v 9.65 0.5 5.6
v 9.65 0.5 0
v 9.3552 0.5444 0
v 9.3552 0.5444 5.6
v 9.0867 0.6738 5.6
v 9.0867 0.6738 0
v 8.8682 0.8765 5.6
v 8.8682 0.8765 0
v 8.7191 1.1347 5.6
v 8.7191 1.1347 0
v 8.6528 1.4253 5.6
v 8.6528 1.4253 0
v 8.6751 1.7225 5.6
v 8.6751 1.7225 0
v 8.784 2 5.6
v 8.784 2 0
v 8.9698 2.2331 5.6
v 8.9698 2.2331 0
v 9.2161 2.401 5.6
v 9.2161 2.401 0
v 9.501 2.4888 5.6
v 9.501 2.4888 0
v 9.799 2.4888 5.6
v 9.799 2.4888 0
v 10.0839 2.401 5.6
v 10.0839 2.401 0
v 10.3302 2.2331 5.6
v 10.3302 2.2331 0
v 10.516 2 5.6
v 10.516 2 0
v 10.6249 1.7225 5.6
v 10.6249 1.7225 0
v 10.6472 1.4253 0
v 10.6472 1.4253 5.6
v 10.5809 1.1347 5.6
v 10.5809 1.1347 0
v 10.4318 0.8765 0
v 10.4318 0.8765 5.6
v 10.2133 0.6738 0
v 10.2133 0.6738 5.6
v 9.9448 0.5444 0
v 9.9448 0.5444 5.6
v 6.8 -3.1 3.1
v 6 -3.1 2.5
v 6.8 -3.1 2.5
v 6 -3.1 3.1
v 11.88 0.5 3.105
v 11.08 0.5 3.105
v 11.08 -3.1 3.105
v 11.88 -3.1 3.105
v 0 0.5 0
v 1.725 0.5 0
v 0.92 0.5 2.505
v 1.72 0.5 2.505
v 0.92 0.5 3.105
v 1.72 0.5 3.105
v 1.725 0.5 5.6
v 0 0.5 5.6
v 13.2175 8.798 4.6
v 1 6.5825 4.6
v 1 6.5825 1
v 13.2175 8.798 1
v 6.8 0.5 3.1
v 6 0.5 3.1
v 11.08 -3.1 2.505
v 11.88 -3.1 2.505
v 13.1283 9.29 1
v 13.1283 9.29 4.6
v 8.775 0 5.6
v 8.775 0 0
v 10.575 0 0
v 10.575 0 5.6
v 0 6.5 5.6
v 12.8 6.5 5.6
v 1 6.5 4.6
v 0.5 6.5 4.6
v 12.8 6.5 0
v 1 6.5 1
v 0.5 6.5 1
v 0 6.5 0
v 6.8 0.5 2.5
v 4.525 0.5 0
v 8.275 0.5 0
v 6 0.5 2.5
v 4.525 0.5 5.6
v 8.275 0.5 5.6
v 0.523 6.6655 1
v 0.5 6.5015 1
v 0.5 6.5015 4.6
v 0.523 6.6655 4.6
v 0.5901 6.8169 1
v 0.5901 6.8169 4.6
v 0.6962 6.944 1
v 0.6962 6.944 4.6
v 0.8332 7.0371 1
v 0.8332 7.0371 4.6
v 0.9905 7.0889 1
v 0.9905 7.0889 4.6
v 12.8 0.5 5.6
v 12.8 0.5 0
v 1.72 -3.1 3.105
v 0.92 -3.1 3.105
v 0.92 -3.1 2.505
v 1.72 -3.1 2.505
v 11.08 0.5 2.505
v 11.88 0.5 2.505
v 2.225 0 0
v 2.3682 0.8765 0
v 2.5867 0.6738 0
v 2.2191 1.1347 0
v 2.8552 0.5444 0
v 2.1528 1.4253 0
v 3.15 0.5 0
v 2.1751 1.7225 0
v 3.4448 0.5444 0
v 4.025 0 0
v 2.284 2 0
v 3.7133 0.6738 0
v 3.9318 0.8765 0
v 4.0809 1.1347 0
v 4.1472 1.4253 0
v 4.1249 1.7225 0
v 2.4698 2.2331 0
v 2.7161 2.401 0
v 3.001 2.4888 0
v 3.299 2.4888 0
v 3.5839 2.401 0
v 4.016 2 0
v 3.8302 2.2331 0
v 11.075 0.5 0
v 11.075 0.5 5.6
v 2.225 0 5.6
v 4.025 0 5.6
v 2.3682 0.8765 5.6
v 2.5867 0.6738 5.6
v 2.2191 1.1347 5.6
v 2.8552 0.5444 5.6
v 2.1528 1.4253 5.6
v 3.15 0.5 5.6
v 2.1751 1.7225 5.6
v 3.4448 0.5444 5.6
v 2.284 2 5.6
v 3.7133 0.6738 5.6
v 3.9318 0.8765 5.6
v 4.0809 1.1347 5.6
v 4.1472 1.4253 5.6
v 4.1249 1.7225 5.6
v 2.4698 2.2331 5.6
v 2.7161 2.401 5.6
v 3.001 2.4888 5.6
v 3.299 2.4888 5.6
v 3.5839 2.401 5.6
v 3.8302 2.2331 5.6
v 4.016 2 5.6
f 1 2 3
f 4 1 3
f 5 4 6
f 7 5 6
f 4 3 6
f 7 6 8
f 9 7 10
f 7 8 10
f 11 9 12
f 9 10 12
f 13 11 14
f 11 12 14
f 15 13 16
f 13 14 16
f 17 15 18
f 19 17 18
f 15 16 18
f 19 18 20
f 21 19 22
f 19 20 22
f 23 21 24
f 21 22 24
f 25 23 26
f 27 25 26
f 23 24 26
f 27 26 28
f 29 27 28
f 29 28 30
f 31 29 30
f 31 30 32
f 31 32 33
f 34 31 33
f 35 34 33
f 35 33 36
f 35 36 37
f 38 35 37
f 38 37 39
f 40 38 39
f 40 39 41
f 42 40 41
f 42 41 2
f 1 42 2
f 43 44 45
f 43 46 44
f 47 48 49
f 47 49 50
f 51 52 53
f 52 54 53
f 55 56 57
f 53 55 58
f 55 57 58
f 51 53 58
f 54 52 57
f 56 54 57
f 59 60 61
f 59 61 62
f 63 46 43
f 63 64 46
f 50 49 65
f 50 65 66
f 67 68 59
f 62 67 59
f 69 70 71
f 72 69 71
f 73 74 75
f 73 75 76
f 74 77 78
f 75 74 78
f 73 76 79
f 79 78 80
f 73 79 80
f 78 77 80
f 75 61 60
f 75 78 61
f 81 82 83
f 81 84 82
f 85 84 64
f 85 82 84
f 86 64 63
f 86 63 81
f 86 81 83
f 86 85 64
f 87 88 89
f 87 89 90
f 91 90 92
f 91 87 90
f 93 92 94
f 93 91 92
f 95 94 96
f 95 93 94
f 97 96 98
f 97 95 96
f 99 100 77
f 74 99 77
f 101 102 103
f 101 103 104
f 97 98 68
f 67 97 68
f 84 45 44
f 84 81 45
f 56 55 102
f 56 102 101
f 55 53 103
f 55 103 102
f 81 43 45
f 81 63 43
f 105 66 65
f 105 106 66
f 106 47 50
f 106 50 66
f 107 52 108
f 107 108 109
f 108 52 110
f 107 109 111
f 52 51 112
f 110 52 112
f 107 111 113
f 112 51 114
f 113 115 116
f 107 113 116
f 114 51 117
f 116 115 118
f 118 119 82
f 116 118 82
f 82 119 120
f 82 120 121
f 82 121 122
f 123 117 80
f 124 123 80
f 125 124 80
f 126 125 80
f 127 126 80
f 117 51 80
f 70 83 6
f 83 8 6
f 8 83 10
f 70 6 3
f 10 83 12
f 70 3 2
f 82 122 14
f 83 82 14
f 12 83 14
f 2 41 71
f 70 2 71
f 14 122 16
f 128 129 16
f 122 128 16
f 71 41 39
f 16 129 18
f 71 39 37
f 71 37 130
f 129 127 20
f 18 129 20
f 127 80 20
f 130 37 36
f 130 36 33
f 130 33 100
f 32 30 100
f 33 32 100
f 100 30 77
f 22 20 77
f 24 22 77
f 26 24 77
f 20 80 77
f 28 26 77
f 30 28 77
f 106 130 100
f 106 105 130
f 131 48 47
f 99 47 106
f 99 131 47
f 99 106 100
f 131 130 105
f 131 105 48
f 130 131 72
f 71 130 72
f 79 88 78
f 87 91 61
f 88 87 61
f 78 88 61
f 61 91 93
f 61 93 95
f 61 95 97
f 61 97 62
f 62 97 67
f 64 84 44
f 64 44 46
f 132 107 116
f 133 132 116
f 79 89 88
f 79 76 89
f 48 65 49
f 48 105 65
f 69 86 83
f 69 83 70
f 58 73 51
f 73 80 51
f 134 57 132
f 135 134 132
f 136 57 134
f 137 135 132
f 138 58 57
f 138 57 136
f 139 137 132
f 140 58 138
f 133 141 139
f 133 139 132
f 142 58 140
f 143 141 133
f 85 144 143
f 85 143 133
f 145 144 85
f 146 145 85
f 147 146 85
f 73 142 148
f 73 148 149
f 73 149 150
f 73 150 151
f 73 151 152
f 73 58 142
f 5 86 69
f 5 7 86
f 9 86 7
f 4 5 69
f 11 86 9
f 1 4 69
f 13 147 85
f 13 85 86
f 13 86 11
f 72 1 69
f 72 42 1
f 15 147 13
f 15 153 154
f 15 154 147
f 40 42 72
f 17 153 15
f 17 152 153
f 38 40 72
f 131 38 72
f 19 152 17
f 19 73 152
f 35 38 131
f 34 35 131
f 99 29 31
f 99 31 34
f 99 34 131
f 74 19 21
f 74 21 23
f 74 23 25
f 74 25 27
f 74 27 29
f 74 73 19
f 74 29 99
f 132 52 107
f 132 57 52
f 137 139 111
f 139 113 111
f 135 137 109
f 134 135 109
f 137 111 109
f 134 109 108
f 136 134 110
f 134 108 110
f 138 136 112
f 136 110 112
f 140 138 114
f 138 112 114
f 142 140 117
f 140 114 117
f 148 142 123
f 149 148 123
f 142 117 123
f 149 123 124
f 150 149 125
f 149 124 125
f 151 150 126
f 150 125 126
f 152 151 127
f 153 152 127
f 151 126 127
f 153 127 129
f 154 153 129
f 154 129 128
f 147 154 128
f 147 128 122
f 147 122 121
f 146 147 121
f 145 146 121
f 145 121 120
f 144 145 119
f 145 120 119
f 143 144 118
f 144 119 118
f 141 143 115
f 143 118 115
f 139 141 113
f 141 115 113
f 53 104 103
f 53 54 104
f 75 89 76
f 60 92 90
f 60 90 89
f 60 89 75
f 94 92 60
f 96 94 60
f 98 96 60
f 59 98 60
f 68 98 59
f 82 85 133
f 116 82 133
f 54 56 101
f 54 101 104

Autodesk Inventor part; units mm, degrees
ref_plane "YZ Plane" through (0, 0, 0) normal (1, 0, 0) x (0, 1, 0)
ref_plane "XZ Plane" through (0, 0, 0) normal (0, 1, 0) x (-1, 0, 0)
ref_plane "XY Plane" through (0, 0, 0) normal (0, 0, 1) x (1, 0, 0)
sketch "Sketch1" plane through (0, 0, 0) normal (0, 0, 1) x (1, 0, 0)
  line L0 (0, 0) -> (12.8, 0)
  line L1 (12.8, 0) -> (12.8, 6.5)
  line L2 (12.8, 6.5) -> (0, 6.5)
  line L3 (0, 6.5) -> (0, 0)
  dimension "d0" = 12.8
  dimension "d1" = 6.5
extrude "Extrusion1" add sketch "Sketch1" along normal blind 5.6
sketch "Sketch2" plane through (0, 0, 5.6) normal (0, 0, 1) x (1, 0, 0)
  line L0 (0, 0) -> (0, 6.5) projected
  line L1 (12.8, 0) -> (0, 0) projected
  point P0 (3.15, 1.5)
  point P1 (9.65, 1.5)
  dimension "d4" = 6.5
  dimension "d5" = 3.15
  dimension "d6" = 1.5
hole "Hole1" at (3.15, 1.5, 5.6) at (9.65, 1.5, 5.6) direction (0, 0, -1) diameter 2 end through all
sketch "Sketch3" plane through (0, 0, 5.6) normal (0, 0, 1) x (1, 0, 0)
  line L0 (12.8, 0) -> (0, 0) projected
  line L1 (0, 0) -> (2.225, 0)
  line L2 (2.225, 0) -> (2.225, 0)
  line L3 (1.725, 0.5) -> (0, 0.5)
  line L4 (0, 0.5) -> (0, 0)
  line L5 (4.525, 0.5) -> (8.275, 0.5)
  line L6 (8.775, 0) -> (8.775, 0)
  line L7 (8.775, 0) -> (4.025, 0)
  line L8 (4.025, 0) -> (4.025, 0)
  line L9 (11.075, 0.5) -> (12.8, 0.5)
  line L10 (12.8, 0.5) -> (12.8, 0)
  line L11 (12.8, 0) -> (10.575, 0)
  line L12 (10.575, 0) -> (10.575, 0)
  line L13 (1.725, 0.5) -> (2.225, 0)
  line L14 (4.525, 0.5) -> (4.025, 0)
  line L15 (8.275, 0.5) -> (8.775, 0)
  line L16 (11.075, 0.5) -> (10.575, 0)
  point P0 (2.225, 0.5)
  point P1 (4.025, 0.5)
  point P2 (8.775, 0.5)
  point P3 (10.575, 0.5)
  dimension "d14" = 0.5
  dimension "d17" = 2.225
  dimension "d18" = 2.225
  dimension "d19" = 0.5
  dimension "d20" = 0.5
  dimension "d21" = 0.5
  dimension "d22" = 0.5
  dimension "d23" = 0.5
  dimension "d24" = 0.5
  dimension "d25" = 0.5
  dimension "d26" = 0.5
  dimension "d49" = 1.8
  dimension "d50" = 1.8
extrude "Extrusion2" cut sketch "Sketch3" against normal through all
sketch "Sketch4" plane through (0, 6.5, 0) normal (0, 1, 0) x (1, 0, 0)
  line L0 (12.8, 0) -> (0, 0) projected
  line L1 (0, 0) -> (0, -5.6) projected
  line L2 (0.5, -1) -> (1, -1)
  line L3 (1, -1) -> (1, -4.6)
  line L4 (1, -4.6) -> (0.5, -4.6)
  line L5 (0.5, -4.6) -> (0.5, -1)
  dimension "d29" = 3.6
  dimension "d30" = 1
  dimension "d31" = 0.5
  dimension "d32" = 0.5
extrude "Extrusion3" add sketch "Sketch4" along normal blind 0.5
sketch "Sketch5" plane through (0.5, 6.5, 4.6) normal (0, 0, 1) x (1, 0, 0)
  line L0 (0, 0.5) -> (12.6283, 2.79)
  line L1 (0.0892, 0.008) -> (12.7175, 2.298)
  line L2 (12.6283, 2.79) -> (12.7175, 2.298)
  line L3 (0, 0.5) -> (0.0892, 0.008)
  dimension "d35" = 0.5
extrude "Extrusion4" add sketch "Sketch5" against normal blind 3.6
fillet "Fillet1" radius 0.6 1 edges at (0.5, 7, 2.8)
sketch "Sketch6" plane through (4.525, 0.5, 5.6) normal (0, -1, 0) x (1, 0, 0)
  line L0 (1.475, -2.5) -> (2.275, -2.5)
  line L1 (2.275, -2.5) -> (2.275, -3.1)
  line L2 (2.275, -3.1) -> (1.475, -3.1)
  line L3 (1.475, -3.1) -> (1.475, -2.5)
  line L4 (-3.605, -2.495) -> (-2.805, -2.495)
  line L5 (-2.805, -2.495) -> (-2.805, -3.095)
  line L6 (-2.805, -3.095) -> (-3.605, -3.095)
  line L7 (-3.605, -3.095) -> (-3.605, -2.495)
  line L8 (6.555, -2.495) -> (7.355, -2.495)
  line L9 (7.355, -2.495) -> (7.355, -3.095)
  line L10 (7.355, -3.095) -> (6.555, -3.095)
  line L11 (6.555, -3.095) -> (6.555, -2.495)
  line L12 (-4.525, -5.6) -> (-4.525, 0) projected
  line L13 (0, 0) -> (3.75, 0) projected
  dimension "d39" = 0.6
  dimension "d40" = 0.8
  dimension "d41" = 0.8
  dimension "d42" = 0.8
  dimension "d43" = 4.28
  dimension "d44" = 4.28
  dimension "d45" = 0.92
  dimension "d48" = 2.5
extrude "Extrusion5" add sketch "Sketch6" along normal blind 3.6
equation "\"d20\" = d19"
equation "\"d21\" = d19"
equation "\"d22\" = d21"
equation "\"d23\" = d19"
equation "\"d24\" = d23"
equation "\"d25\" = d19"
equation "\"d26\" = d25"
properties part number "switch"
